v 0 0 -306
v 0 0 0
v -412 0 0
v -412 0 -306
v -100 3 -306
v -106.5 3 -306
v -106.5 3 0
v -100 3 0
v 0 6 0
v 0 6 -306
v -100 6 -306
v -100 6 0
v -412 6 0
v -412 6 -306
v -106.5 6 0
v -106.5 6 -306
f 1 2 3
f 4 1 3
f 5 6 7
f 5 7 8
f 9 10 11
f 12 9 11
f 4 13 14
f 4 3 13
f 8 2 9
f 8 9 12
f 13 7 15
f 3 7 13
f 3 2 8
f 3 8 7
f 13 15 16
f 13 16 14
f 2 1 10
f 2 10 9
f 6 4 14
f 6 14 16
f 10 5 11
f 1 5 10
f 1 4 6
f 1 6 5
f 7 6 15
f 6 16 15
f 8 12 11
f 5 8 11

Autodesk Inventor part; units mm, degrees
ref_plane "YZ Plane" through (0, 0, 0) normal (1, 0, 0) x (0, 1, 0)
ref_plane "XZ Plane" through (0, 0, 0) normal (0, 1, 0) x (-1, 0, 0)
ref_plane "XY Plane" through (0, 0, 0) normal (0, 0, 1) x (1, 0, 0)
sketch "Sketch1" plane through (0, 0, 0) normal (0, 1, 0) x (-1, 0, 0)
  line L0 (0, 0) -> (412, 0)
  line L1 (412, 0) -> (412, -306)
  line L2 (412, -306) -> (0, -306)
  line L3 (0, -306) -> (0, 0)
  dimension "d0" = 306
  dimension "d1" = 412
extrude "Extrusion1" add sketch "Sketch1" along normal blind 6
sketch "Sketch2" plane through (0, 6, 0) normal (0, 1, 0) x (1, 0, 0)
  line L0 (-412, 0) -> (0, 0) projected
  line L1 (0, 306) -> (-412, 306) projected
  line L2 (-106.5, 0) -> (-100, 0)
  line L3 (-100, 0) -> (-100, 306)
  line L4 (-100, 306) -> (-106.5, 306)
  line L5 (-106.5, 306) -> (-106.5, 0)
  line L6 (0, 0) -> (0, 306) projected
  dimension "d4" = 6.5
  dimension "d5" = 100
extrude "Extrusion2" cut sketch "Sketch2" against normal blind 3 contours L5 L1 L3 L0
properties part number "planche_bas" material "Wood (Birch)"
